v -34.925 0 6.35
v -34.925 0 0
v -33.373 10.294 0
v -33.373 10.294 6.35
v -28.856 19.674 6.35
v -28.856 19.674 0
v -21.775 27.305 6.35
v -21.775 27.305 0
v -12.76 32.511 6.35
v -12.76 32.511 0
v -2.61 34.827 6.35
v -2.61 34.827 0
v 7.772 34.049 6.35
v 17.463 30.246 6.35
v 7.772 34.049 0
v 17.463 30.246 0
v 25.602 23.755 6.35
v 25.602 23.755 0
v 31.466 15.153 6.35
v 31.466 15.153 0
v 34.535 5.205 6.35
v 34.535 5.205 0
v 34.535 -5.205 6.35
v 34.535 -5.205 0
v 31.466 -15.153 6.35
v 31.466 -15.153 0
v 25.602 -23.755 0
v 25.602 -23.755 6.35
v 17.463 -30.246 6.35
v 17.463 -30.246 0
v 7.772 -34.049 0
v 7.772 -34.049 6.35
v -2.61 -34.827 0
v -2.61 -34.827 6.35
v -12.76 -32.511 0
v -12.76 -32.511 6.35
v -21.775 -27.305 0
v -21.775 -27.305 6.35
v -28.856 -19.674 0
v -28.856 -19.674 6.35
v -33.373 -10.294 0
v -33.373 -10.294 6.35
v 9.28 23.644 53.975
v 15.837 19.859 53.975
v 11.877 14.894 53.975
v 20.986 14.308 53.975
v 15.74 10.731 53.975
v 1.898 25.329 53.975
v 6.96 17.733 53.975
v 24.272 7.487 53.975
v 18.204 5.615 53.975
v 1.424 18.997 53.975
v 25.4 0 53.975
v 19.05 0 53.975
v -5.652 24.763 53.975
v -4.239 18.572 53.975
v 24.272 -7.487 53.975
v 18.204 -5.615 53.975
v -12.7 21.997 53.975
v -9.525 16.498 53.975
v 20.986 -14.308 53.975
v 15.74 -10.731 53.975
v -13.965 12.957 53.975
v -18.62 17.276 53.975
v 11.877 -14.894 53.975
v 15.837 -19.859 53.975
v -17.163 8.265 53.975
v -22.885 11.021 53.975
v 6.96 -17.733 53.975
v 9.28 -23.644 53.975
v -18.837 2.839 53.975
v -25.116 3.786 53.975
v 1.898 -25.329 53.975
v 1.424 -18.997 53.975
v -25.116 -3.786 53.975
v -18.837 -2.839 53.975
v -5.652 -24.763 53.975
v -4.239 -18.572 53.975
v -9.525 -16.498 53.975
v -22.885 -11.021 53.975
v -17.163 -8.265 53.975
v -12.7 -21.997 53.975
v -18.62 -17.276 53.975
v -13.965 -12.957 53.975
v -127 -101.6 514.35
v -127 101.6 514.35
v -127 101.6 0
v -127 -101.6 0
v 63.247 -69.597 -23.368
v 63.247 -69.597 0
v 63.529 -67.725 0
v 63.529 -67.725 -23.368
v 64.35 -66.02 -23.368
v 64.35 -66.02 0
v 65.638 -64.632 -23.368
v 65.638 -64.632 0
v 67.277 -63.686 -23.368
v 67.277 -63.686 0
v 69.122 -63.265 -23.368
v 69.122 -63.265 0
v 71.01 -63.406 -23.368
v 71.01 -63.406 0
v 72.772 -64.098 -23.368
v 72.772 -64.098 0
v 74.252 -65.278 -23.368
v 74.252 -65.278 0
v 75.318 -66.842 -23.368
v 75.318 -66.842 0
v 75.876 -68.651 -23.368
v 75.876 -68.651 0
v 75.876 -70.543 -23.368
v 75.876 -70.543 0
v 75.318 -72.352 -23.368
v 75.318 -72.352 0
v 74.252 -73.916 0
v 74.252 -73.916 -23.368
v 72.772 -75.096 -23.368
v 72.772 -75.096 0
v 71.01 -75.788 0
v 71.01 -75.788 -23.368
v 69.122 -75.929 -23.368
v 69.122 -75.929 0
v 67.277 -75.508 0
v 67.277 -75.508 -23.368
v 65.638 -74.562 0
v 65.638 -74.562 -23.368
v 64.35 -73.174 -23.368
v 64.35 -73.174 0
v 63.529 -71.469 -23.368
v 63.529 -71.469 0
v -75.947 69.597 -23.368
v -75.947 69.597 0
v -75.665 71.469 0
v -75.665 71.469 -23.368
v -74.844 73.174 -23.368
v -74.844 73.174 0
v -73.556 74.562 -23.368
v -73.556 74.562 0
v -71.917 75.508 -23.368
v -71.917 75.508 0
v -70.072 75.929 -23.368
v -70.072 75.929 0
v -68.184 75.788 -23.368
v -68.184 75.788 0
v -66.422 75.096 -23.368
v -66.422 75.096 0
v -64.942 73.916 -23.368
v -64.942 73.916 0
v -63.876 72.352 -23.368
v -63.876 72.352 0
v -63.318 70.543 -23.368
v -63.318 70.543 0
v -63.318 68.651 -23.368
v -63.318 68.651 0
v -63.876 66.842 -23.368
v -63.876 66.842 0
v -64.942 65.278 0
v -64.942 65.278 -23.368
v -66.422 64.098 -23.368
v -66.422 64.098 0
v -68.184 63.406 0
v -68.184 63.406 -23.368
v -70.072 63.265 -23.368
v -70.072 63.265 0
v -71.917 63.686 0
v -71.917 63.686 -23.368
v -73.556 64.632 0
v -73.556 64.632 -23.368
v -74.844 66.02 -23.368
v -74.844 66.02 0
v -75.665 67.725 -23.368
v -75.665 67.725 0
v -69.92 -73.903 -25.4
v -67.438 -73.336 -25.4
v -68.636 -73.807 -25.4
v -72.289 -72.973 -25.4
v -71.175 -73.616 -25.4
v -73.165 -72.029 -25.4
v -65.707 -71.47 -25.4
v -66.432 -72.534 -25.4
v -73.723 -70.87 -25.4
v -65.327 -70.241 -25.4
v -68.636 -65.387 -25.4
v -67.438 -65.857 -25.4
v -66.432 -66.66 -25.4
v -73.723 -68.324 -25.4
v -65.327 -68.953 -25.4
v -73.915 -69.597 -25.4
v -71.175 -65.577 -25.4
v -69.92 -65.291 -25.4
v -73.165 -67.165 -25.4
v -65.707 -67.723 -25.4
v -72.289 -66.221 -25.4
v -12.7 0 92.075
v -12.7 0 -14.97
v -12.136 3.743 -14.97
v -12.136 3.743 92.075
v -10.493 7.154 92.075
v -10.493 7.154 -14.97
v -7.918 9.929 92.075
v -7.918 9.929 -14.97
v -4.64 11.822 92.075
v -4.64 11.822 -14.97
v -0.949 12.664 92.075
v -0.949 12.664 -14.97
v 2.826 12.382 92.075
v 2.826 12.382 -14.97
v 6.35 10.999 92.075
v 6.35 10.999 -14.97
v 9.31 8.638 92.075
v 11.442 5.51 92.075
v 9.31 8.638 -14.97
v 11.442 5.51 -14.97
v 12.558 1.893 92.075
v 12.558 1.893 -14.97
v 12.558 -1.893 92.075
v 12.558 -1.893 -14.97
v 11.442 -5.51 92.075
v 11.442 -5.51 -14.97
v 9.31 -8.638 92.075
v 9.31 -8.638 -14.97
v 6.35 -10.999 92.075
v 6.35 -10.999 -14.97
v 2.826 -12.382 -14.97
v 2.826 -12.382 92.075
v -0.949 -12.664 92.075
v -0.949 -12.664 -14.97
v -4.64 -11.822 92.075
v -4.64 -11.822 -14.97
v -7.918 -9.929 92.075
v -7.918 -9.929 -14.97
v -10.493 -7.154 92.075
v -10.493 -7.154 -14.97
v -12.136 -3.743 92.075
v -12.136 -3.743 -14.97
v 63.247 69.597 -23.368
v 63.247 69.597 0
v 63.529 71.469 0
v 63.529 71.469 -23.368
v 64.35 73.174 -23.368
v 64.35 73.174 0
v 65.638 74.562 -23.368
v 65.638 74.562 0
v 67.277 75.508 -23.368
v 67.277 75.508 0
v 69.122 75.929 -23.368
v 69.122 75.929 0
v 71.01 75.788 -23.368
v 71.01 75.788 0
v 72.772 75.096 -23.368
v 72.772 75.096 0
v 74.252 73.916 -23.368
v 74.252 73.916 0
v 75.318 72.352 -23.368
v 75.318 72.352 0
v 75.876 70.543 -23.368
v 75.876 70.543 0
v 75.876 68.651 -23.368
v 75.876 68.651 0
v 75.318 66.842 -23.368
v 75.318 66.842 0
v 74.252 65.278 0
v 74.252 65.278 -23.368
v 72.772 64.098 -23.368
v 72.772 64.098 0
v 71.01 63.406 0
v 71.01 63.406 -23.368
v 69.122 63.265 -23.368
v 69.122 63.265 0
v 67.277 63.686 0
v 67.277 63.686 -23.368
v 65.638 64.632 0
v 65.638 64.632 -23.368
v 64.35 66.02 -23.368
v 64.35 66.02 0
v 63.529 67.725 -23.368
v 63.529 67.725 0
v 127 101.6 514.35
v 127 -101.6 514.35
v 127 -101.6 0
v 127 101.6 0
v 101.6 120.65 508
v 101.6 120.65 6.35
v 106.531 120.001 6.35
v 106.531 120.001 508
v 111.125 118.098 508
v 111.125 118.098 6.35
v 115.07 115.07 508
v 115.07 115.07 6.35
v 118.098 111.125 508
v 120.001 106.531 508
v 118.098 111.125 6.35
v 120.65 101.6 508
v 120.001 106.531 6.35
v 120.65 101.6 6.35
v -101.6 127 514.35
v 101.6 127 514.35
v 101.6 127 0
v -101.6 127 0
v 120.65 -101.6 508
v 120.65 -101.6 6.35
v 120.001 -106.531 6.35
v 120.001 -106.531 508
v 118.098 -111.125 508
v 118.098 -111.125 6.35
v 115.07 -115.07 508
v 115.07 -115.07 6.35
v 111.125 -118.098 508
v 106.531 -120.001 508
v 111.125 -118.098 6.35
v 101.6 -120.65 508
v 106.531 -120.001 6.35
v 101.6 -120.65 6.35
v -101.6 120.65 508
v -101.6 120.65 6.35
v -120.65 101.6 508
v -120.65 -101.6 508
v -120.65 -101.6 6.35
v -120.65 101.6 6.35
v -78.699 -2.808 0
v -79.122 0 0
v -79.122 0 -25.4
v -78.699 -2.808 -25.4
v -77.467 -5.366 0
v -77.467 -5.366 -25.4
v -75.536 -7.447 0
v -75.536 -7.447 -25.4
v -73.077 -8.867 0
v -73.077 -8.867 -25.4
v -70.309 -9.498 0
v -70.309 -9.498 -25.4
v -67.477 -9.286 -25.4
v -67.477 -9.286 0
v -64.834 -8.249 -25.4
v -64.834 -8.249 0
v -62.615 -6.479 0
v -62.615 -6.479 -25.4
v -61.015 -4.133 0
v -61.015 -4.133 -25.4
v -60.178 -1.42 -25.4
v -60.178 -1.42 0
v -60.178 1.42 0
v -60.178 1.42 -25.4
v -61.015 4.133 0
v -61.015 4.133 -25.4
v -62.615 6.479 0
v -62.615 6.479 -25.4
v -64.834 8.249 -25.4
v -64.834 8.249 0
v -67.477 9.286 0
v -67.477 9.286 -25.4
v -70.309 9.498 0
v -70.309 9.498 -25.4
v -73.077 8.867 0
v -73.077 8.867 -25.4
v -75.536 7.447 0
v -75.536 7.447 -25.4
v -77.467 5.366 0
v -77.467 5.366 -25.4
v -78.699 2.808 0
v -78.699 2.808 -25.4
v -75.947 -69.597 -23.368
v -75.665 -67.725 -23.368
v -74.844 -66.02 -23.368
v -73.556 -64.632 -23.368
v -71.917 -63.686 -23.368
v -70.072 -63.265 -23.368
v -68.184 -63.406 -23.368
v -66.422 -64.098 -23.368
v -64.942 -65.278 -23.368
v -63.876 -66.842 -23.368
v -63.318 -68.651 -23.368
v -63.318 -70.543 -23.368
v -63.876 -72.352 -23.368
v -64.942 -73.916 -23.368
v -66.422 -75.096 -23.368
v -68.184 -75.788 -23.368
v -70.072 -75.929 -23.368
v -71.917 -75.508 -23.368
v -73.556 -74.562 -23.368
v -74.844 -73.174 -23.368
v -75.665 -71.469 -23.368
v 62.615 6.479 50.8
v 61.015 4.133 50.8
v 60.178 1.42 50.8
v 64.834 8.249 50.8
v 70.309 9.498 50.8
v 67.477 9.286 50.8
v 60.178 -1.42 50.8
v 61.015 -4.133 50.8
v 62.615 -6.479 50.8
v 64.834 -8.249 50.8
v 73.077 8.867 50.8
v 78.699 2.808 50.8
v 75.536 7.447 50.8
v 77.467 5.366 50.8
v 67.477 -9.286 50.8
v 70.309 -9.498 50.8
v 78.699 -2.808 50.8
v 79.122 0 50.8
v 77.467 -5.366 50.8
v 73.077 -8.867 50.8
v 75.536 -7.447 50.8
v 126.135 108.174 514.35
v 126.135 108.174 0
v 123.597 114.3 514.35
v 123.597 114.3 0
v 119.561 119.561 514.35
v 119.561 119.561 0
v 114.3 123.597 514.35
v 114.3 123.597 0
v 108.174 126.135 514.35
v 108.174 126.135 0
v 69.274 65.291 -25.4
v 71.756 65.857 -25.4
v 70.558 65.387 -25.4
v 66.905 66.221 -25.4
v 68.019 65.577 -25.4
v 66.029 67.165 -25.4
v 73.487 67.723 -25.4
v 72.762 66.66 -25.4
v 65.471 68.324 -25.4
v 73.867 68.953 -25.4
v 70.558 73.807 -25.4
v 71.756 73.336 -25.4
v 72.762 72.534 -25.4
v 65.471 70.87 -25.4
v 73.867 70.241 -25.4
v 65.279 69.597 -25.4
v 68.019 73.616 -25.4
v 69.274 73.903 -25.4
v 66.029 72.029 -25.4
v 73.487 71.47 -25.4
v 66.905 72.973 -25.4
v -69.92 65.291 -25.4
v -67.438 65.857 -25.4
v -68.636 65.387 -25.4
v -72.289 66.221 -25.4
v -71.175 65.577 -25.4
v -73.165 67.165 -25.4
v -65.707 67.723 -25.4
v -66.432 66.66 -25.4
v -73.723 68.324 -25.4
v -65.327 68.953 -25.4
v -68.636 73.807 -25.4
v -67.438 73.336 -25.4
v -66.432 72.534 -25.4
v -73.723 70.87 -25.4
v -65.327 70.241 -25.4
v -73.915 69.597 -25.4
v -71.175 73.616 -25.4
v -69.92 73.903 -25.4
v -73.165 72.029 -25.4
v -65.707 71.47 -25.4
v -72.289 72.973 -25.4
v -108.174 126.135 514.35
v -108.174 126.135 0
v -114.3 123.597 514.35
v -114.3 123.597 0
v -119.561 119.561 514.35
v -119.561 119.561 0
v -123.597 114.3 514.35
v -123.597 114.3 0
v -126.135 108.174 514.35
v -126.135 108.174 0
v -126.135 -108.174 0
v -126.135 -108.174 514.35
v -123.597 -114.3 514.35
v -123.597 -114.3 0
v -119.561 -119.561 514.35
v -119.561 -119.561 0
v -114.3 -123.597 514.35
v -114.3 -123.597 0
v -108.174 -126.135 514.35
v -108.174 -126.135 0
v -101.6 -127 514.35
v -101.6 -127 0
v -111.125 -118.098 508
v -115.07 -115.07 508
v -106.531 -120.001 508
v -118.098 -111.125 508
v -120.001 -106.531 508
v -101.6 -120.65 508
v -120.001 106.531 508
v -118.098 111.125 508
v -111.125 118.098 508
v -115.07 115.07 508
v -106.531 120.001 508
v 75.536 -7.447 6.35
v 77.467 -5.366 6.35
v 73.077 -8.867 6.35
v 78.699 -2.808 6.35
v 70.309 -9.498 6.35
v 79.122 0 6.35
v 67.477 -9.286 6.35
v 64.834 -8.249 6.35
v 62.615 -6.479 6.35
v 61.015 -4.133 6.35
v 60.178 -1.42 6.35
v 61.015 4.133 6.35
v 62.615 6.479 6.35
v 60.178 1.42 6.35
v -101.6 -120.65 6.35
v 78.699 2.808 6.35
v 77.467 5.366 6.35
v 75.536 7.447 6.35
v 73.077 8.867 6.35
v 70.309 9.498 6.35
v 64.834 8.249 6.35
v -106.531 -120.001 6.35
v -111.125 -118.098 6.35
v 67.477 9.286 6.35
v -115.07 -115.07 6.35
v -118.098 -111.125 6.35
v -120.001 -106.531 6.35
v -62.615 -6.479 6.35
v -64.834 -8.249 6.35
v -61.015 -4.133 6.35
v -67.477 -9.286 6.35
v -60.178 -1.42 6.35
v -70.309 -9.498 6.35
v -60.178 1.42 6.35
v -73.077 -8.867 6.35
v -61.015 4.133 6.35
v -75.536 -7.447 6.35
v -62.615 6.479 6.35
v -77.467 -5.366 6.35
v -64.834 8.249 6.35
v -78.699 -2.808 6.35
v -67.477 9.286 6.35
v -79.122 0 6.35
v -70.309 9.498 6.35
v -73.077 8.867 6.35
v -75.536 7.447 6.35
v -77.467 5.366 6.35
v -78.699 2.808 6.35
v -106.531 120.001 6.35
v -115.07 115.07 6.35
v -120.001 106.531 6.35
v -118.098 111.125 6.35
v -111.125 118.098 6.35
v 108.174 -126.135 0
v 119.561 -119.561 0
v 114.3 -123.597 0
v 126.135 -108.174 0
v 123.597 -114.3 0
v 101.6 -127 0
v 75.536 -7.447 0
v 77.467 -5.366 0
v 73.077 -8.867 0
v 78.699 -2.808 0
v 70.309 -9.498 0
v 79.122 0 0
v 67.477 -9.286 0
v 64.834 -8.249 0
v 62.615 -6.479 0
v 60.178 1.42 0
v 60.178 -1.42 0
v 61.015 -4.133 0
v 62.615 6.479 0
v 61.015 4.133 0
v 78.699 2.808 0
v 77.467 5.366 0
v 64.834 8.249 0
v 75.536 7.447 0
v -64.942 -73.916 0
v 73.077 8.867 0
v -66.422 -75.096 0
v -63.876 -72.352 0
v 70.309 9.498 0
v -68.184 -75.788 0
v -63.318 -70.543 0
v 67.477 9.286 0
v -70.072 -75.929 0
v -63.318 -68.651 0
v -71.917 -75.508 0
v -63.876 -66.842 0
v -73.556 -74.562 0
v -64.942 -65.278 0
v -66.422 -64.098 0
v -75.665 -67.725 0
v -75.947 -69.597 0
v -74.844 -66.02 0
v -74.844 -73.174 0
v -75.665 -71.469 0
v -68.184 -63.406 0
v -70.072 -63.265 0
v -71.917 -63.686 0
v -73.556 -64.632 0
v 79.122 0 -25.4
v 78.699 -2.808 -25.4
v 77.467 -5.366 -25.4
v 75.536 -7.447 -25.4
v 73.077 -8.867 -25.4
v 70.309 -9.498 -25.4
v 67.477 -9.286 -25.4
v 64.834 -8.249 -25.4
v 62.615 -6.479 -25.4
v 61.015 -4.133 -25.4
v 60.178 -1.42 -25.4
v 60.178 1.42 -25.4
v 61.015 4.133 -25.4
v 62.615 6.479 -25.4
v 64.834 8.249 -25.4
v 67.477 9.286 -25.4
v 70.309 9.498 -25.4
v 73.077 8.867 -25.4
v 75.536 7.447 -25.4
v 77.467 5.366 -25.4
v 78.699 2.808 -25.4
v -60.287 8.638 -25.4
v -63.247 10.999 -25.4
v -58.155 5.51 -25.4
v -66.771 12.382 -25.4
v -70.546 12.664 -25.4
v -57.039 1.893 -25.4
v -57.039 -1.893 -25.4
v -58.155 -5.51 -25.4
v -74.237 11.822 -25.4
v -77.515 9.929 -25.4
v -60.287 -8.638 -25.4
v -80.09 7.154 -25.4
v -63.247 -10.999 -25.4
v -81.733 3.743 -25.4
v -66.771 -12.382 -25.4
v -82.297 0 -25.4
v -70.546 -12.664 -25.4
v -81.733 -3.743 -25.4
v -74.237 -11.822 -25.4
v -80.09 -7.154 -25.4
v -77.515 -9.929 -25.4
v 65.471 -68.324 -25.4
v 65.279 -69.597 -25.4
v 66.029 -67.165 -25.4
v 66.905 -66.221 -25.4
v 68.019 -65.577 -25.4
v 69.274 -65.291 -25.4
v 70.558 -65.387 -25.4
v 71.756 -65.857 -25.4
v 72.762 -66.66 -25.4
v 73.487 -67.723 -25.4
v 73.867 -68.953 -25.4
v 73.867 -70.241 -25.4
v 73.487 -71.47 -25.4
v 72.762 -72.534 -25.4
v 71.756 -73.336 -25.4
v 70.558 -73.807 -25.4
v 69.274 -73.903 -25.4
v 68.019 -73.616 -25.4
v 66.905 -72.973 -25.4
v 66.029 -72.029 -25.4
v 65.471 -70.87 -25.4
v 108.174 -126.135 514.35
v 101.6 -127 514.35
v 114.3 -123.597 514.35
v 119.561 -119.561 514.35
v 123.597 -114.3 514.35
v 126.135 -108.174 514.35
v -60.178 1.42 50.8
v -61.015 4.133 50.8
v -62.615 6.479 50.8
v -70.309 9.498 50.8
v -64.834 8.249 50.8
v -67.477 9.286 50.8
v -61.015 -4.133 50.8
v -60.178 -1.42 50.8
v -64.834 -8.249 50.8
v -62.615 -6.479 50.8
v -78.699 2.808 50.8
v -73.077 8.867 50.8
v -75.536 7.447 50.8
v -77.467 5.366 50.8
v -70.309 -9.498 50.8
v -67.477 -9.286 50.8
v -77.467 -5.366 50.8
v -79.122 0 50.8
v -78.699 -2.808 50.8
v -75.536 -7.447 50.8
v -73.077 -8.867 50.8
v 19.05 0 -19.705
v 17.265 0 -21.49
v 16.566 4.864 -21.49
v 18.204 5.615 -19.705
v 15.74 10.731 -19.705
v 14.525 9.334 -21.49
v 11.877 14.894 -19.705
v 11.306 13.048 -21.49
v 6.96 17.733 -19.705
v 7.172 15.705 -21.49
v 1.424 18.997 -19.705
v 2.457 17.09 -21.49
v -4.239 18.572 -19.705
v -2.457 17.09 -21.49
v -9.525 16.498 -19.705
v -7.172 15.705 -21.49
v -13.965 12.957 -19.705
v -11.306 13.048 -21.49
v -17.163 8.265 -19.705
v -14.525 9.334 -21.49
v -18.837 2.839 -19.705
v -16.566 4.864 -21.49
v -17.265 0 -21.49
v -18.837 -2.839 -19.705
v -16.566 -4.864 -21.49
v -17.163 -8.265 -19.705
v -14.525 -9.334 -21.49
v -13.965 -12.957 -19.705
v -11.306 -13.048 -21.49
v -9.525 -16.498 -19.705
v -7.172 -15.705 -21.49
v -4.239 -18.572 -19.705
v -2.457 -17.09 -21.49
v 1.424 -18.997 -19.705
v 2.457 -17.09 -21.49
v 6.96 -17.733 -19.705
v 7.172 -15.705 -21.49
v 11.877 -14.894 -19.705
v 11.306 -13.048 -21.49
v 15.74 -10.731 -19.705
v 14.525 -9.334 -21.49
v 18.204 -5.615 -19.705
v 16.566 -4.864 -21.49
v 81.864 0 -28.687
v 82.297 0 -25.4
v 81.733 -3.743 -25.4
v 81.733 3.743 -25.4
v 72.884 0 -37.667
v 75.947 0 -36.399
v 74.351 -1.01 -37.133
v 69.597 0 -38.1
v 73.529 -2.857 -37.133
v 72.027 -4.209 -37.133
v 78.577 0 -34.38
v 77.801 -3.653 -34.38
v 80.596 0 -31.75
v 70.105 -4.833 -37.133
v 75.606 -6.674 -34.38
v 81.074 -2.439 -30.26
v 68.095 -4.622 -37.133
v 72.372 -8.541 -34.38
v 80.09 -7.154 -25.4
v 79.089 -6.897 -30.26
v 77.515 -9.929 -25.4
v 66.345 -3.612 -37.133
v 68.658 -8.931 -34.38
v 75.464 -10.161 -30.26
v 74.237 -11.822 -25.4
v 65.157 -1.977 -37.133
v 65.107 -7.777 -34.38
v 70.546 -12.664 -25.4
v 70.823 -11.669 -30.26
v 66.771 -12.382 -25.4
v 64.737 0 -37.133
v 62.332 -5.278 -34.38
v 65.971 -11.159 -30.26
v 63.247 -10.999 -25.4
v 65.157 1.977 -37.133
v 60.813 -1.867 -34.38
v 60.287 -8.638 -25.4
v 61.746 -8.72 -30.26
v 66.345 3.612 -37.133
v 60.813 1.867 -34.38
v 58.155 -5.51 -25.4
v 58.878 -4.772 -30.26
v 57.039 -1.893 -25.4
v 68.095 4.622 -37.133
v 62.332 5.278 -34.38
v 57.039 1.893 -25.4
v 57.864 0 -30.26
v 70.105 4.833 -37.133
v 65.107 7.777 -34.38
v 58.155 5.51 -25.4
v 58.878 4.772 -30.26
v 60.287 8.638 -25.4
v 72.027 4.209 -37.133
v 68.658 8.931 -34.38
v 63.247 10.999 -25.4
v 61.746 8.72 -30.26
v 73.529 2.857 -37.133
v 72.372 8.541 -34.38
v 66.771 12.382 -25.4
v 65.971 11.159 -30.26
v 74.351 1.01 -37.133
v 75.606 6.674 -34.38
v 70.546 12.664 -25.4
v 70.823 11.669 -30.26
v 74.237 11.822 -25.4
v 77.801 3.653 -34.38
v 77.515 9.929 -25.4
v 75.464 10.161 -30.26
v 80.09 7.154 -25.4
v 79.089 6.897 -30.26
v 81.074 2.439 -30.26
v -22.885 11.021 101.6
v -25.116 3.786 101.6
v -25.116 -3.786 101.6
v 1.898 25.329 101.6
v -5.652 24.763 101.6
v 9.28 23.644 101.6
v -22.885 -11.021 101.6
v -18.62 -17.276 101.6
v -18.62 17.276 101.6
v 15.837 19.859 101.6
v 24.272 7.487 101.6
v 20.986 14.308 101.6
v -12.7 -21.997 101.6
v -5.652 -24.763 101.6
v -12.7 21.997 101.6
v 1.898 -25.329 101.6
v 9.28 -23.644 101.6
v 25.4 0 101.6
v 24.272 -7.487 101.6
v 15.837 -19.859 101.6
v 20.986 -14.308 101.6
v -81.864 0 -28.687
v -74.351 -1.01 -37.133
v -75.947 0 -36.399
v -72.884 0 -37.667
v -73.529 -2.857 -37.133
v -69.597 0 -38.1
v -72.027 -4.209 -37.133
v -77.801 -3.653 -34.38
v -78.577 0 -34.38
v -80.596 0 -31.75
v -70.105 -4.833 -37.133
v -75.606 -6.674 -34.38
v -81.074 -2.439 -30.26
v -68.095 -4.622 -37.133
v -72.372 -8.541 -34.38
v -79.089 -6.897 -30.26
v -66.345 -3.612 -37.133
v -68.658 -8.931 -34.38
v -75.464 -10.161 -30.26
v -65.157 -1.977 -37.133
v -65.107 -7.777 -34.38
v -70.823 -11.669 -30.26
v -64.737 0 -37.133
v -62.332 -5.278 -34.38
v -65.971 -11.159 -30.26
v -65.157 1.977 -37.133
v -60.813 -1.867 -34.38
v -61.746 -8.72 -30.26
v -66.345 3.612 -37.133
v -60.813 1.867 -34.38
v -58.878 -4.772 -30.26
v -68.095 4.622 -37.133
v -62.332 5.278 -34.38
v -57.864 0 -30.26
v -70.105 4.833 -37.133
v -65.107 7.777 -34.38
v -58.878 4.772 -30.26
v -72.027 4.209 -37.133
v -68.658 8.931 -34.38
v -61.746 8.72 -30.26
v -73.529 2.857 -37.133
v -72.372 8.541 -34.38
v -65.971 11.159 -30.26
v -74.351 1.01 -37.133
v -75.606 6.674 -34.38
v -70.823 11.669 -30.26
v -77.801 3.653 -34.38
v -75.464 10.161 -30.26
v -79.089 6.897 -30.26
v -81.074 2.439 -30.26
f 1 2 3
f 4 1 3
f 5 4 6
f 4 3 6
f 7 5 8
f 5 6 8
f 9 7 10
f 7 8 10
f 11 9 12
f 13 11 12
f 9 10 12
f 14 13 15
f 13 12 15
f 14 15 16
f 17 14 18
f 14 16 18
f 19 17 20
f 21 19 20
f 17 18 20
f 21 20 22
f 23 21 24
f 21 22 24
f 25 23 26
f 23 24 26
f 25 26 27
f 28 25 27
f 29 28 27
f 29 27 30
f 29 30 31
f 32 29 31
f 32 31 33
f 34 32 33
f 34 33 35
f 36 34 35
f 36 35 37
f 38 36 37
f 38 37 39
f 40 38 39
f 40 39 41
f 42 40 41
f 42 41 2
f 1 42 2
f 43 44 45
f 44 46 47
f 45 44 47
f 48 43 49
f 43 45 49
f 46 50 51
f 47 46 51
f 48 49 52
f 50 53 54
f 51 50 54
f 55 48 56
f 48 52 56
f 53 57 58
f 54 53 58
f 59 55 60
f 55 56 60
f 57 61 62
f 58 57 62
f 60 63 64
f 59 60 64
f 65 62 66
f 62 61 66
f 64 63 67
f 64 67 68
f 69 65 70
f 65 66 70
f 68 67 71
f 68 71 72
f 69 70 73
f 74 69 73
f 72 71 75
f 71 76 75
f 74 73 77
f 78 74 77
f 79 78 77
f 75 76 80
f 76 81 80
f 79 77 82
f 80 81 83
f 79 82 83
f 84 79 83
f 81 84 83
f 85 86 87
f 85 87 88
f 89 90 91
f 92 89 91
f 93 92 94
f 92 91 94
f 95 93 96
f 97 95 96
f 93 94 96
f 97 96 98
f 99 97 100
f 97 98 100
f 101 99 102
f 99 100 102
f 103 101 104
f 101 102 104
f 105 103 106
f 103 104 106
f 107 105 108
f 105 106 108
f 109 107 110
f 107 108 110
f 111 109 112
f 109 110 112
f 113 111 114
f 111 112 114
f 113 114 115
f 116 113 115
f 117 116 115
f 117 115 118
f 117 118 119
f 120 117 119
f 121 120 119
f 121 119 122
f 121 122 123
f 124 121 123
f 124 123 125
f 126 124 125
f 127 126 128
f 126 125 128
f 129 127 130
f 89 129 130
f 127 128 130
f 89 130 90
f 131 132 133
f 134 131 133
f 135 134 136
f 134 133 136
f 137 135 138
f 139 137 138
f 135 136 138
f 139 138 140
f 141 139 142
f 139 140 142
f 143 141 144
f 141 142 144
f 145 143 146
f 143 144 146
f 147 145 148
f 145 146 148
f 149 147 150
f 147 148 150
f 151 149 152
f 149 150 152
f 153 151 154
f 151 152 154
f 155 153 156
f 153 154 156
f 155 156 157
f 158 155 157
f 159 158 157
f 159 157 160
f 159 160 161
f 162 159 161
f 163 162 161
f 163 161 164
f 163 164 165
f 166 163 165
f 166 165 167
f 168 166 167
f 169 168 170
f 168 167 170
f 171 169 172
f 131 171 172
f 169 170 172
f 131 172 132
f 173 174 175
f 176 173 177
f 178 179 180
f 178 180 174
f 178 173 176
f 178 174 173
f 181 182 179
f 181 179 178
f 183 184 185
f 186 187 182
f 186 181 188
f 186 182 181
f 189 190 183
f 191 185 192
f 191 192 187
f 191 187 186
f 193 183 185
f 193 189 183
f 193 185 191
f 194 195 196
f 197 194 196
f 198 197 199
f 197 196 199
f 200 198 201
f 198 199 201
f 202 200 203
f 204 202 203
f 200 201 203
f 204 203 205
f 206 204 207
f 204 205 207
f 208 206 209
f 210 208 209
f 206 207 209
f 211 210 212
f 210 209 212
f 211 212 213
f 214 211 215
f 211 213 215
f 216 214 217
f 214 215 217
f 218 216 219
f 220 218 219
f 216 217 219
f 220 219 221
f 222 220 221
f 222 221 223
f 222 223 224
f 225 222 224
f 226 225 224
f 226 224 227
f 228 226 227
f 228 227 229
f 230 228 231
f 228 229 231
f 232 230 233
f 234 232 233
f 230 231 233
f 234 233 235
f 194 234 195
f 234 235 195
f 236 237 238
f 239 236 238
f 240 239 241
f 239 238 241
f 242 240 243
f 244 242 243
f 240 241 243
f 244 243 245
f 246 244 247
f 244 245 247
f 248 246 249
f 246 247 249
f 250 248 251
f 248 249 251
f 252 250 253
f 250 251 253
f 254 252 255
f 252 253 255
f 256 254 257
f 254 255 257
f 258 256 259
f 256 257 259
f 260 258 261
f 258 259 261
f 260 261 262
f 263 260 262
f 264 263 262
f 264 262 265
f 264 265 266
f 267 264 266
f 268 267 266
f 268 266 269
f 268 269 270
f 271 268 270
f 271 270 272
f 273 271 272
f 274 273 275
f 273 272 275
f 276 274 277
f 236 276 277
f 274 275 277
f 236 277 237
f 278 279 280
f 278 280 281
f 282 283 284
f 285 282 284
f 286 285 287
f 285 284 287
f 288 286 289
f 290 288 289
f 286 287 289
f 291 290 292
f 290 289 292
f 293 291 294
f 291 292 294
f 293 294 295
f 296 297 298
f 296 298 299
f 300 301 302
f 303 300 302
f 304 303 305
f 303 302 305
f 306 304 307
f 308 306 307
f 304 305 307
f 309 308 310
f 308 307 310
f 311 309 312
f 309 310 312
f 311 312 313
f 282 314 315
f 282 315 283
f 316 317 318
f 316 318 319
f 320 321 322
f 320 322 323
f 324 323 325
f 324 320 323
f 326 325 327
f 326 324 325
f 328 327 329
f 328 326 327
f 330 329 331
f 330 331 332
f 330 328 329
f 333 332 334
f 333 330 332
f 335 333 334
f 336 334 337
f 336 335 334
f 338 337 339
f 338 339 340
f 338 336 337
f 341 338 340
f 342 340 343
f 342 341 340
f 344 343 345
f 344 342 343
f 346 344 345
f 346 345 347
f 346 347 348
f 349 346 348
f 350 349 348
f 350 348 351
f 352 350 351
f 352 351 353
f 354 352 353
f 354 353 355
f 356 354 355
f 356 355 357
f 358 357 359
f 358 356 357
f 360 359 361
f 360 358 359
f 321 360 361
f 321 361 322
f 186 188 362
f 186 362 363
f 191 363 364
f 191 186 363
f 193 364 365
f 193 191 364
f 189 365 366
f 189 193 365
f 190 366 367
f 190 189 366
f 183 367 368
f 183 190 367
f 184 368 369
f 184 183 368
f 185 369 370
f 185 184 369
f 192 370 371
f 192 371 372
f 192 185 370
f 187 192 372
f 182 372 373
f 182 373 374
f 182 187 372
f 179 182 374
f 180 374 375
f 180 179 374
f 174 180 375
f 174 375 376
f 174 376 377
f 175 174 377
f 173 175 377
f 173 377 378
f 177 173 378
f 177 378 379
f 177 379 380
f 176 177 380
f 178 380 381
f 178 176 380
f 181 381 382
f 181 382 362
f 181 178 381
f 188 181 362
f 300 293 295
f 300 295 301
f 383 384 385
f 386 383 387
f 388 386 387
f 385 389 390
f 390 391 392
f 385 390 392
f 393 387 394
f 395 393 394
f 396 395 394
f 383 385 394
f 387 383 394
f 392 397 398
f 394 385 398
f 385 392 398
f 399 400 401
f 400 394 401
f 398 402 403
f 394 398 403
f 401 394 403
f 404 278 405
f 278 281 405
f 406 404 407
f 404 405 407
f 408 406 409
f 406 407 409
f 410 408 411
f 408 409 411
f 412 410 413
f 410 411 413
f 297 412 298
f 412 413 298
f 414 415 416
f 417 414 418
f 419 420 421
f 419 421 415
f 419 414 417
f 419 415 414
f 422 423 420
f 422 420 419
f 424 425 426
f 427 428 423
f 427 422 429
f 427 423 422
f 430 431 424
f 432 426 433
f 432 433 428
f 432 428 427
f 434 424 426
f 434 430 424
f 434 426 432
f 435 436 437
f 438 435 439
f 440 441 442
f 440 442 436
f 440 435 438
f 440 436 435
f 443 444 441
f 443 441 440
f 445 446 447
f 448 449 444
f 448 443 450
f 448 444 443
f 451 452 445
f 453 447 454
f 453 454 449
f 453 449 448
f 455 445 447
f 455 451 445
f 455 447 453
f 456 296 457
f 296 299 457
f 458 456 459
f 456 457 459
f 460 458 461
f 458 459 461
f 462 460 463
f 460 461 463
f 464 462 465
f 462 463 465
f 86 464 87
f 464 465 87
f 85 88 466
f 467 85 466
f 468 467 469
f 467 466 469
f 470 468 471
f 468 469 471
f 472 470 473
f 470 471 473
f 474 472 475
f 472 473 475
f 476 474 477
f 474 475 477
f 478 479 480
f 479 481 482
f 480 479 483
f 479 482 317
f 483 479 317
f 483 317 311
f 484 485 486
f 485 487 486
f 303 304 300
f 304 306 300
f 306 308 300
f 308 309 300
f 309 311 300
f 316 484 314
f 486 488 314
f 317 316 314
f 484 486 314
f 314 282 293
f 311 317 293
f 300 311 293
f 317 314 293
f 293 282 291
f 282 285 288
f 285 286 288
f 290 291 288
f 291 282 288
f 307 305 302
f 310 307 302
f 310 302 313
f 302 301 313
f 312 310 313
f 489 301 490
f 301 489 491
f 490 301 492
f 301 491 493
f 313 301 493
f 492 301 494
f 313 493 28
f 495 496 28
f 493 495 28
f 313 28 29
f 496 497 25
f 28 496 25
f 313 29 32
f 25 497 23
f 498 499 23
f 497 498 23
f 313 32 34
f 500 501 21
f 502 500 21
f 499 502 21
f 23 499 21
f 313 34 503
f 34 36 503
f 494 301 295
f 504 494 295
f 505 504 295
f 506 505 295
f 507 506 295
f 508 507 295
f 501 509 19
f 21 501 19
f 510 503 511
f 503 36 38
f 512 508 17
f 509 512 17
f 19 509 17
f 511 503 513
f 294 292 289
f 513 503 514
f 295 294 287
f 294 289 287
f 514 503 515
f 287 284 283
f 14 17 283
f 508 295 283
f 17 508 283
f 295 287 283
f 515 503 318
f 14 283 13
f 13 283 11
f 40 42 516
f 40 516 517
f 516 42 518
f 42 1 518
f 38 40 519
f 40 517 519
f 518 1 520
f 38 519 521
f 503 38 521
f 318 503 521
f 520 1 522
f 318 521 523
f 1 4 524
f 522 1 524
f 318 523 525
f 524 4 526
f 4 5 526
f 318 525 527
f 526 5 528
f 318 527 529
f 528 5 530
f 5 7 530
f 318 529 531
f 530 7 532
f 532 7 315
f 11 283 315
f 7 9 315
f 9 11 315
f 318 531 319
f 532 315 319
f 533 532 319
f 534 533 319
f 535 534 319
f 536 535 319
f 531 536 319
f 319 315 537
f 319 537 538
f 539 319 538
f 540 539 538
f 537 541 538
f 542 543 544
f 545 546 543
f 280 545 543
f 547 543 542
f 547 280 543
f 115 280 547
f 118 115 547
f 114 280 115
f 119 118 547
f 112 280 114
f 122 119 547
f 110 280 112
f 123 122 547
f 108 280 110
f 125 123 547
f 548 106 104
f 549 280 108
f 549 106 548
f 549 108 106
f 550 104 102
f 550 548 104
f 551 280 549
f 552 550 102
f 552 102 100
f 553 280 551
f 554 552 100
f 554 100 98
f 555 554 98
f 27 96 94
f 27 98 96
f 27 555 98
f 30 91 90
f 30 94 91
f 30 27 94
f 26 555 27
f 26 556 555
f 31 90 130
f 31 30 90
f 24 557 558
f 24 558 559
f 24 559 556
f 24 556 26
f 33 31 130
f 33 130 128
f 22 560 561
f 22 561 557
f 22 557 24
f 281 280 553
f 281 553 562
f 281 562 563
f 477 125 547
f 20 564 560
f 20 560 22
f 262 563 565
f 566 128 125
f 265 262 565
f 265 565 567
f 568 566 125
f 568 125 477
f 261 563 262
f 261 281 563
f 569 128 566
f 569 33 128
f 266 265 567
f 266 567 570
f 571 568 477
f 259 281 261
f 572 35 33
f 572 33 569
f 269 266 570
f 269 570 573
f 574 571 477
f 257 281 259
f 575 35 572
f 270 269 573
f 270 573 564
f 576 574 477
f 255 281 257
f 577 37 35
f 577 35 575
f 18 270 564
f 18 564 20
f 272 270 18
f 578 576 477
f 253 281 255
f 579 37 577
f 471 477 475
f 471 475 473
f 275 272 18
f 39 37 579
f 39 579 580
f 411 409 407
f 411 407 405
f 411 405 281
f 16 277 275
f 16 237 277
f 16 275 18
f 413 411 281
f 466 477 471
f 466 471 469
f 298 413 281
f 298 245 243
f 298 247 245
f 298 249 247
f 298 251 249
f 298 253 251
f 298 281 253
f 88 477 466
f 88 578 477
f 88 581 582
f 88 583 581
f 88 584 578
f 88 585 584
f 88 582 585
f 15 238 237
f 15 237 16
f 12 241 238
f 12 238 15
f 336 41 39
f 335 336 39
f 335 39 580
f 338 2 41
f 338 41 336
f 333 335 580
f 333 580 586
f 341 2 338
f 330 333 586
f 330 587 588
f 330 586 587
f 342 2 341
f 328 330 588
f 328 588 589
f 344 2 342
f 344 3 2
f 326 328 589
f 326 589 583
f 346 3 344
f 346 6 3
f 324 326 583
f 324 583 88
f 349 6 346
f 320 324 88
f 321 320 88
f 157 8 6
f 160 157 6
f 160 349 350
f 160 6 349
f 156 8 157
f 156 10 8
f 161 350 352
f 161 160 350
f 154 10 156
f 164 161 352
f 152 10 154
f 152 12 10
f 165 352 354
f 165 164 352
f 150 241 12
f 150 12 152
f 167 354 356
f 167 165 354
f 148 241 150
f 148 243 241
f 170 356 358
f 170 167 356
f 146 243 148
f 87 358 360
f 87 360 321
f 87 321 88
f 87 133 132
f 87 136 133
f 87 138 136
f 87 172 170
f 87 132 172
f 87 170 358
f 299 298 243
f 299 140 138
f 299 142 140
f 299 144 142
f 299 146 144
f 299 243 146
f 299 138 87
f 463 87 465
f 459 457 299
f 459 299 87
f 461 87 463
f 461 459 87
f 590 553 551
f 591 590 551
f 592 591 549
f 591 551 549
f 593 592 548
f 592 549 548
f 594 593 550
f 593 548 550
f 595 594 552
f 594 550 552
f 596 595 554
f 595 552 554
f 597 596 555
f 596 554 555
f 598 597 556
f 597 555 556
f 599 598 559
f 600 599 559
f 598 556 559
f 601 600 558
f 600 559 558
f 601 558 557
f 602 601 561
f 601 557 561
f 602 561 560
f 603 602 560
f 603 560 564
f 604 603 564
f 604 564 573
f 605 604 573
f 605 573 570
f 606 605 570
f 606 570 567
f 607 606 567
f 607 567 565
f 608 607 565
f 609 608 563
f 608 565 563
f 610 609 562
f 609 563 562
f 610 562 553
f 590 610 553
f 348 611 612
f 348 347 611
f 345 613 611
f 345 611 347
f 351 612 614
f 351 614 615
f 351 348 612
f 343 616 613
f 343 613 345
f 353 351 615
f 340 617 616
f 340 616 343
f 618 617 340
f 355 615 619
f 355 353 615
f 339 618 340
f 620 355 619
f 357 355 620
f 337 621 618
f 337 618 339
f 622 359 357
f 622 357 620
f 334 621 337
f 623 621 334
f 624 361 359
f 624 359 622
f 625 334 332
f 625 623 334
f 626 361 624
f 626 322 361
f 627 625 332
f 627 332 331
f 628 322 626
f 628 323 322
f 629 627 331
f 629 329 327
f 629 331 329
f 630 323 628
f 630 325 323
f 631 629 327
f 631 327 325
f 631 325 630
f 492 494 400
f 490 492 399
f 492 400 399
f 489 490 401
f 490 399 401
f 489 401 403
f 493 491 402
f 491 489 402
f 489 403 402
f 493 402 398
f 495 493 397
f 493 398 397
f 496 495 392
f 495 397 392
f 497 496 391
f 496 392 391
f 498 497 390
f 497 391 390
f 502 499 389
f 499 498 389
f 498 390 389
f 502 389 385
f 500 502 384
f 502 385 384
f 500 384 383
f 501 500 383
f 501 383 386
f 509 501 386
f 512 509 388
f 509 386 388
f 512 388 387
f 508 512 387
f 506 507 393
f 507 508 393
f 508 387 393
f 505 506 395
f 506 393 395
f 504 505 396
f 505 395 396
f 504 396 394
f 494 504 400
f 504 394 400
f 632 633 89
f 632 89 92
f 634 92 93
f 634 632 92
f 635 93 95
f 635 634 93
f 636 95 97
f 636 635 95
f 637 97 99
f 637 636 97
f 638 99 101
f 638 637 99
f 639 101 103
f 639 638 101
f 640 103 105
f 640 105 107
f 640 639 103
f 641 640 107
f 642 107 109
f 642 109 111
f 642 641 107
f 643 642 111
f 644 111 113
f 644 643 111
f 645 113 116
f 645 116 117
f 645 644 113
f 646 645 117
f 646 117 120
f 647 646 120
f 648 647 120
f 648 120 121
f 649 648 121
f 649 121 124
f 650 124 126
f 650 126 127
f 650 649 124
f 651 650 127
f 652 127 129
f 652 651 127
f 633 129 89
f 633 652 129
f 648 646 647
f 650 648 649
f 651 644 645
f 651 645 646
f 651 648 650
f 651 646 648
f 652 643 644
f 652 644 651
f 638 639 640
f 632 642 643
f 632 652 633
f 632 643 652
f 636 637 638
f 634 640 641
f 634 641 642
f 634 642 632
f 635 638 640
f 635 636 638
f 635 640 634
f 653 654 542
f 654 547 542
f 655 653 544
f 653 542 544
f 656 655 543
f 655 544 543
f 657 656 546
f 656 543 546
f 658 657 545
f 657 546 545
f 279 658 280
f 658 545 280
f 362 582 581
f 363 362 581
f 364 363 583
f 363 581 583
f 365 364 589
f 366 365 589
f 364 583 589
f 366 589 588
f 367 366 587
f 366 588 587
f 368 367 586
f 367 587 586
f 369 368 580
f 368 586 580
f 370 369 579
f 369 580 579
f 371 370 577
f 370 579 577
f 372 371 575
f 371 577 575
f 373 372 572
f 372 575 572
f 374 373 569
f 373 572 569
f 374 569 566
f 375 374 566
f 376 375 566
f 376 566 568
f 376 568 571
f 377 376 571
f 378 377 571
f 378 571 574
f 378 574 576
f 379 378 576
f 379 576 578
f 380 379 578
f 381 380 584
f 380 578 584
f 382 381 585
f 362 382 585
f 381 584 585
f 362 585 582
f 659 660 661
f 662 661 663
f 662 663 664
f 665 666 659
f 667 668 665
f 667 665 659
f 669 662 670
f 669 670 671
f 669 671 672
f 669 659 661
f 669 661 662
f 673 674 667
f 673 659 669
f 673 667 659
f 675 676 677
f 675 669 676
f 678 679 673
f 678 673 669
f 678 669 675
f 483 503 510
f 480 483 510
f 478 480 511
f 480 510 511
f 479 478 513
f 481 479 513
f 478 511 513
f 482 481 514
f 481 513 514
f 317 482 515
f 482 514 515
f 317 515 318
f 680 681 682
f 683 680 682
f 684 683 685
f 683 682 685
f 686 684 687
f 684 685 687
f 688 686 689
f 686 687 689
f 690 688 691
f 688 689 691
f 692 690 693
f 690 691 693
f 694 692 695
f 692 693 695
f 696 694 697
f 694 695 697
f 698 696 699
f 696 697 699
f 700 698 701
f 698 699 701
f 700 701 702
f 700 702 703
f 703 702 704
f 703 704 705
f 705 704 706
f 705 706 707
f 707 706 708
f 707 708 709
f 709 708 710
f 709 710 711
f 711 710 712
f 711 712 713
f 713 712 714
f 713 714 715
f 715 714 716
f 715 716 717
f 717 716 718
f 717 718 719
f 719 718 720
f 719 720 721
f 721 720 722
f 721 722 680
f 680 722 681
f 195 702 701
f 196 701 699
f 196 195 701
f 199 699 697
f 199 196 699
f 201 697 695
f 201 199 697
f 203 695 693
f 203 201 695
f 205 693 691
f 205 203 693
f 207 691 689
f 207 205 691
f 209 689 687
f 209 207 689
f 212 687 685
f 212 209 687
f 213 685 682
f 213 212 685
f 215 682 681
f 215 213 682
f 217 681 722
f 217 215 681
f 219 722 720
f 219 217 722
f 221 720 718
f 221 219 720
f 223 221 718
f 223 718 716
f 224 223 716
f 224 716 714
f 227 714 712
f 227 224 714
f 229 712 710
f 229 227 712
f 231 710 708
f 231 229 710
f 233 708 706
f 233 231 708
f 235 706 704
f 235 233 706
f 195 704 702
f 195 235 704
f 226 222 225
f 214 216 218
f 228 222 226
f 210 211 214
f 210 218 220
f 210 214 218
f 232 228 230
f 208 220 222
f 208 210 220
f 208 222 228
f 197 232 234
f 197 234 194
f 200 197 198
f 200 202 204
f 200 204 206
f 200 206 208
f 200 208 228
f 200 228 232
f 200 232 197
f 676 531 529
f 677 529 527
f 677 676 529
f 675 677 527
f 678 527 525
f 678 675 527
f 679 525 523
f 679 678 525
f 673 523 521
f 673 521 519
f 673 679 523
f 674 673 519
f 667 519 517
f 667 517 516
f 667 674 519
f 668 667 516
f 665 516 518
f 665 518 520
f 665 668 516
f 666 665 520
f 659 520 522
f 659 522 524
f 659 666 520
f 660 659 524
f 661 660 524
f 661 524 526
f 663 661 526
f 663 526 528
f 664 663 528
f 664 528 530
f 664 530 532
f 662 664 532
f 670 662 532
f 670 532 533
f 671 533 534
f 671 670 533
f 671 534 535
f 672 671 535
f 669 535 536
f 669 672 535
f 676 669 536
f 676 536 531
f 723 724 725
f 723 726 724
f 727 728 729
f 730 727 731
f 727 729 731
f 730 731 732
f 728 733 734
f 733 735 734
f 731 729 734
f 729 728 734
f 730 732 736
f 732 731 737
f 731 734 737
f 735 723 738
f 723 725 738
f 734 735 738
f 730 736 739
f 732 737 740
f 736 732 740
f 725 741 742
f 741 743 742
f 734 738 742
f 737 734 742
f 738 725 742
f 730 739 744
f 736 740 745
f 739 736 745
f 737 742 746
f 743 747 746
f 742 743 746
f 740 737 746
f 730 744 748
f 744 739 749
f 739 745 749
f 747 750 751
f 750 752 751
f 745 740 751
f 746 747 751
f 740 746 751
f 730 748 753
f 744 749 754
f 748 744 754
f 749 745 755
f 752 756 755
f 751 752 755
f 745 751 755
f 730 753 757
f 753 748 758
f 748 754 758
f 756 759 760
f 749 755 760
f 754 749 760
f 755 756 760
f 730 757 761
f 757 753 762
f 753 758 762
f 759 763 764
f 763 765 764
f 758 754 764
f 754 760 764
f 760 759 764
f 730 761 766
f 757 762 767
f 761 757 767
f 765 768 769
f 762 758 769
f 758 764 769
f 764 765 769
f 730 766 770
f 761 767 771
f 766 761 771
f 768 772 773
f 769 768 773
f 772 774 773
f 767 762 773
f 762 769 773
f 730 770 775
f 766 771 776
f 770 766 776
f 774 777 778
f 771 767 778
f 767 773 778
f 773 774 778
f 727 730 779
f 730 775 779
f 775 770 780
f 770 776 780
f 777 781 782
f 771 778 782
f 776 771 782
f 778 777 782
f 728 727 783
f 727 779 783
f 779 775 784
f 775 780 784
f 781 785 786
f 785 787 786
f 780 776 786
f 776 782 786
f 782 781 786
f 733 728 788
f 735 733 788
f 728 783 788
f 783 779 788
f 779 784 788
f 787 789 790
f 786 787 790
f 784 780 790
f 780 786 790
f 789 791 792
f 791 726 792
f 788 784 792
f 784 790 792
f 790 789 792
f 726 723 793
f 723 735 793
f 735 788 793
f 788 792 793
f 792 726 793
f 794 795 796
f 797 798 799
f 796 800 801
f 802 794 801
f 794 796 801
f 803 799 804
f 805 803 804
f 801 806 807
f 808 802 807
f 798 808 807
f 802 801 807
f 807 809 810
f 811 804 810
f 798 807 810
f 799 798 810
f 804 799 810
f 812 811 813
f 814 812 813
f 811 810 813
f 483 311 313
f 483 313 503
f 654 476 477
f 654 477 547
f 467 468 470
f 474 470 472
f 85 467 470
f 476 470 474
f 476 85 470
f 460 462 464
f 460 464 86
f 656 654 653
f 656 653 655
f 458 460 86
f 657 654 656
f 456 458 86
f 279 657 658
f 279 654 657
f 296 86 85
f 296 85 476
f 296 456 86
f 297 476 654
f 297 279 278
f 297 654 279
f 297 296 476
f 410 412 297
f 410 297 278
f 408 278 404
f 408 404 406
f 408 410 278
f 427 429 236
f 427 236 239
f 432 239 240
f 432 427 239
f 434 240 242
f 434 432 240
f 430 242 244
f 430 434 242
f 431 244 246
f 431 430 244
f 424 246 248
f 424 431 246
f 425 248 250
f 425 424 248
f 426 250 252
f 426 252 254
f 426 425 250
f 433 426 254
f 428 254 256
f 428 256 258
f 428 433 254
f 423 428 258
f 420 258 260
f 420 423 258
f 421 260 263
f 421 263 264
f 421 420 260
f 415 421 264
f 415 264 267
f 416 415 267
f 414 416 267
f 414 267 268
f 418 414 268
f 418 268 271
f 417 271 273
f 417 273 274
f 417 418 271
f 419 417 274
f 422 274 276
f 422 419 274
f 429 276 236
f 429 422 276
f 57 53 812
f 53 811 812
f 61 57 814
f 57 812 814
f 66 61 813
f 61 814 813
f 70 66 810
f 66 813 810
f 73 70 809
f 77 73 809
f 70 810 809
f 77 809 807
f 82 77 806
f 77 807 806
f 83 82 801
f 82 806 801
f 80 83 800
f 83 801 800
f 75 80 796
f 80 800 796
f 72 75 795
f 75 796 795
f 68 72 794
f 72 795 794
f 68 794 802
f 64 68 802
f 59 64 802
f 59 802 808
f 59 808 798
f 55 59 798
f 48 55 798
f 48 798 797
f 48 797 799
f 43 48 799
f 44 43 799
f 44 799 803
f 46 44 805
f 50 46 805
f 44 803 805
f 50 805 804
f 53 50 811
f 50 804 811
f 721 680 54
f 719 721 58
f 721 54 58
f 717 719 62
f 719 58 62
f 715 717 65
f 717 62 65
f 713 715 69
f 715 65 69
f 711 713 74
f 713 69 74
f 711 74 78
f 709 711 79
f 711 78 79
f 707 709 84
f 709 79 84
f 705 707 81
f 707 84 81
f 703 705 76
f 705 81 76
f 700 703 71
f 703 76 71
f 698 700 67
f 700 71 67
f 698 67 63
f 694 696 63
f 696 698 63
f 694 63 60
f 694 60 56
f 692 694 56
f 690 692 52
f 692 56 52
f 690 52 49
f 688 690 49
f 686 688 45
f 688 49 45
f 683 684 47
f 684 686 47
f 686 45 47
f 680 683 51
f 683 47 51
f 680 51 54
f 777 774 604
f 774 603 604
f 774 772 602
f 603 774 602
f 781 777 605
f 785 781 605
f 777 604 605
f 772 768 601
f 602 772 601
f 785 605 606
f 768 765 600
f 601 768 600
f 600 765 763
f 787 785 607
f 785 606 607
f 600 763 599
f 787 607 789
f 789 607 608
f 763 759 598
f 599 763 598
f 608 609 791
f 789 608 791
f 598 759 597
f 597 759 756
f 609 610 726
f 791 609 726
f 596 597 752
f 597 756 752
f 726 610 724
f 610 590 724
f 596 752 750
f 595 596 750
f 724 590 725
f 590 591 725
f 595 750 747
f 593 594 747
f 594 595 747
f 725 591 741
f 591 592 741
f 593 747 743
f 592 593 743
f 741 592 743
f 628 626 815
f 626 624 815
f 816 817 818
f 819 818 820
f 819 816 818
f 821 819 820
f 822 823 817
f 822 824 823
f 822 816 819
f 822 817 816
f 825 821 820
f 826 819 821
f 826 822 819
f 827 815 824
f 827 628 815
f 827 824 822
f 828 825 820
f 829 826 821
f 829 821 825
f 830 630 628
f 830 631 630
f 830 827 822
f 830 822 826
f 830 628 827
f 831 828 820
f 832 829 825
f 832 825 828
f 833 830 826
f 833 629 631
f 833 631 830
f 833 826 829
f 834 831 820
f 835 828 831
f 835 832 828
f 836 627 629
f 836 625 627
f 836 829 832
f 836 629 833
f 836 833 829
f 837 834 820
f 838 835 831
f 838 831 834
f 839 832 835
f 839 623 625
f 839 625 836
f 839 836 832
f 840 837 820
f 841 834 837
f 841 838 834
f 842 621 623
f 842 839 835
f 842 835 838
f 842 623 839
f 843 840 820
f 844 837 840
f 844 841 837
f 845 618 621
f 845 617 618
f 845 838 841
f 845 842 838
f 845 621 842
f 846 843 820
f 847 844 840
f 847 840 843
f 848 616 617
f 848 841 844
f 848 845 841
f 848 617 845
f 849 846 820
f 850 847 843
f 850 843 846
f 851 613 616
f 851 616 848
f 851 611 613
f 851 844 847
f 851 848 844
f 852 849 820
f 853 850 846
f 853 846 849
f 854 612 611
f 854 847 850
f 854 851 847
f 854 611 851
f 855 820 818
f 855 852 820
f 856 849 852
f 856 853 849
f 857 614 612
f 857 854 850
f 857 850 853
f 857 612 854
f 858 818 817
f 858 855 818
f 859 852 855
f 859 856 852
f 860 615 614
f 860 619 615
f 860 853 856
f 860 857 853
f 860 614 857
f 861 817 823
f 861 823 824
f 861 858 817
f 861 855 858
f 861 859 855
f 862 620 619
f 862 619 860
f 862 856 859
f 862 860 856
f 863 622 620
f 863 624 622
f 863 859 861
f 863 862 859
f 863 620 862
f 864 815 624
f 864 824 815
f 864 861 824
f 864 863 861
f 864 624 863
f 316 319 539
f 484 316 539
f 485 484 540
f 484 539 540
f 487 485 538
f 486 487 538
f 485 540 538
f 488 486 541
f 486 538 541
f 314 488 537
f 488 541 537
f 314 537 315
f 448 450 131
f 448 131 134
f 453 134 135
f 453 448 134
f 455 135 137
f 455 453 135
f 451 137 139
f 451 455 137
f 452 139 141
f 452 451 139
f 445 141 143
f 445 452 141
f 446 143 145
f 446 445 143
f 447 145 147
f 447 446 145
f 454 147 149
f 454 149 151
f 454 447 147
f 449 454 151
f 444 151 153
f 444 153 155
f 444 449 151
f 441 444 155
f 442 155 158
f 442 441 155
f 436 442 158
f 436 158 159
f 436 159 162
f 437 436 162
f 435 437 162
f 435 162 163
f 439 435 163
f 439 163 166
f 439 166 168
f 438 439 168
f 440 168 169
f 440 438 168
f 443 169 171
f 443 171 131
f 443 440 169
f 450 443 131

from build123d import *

# Parameters (mm, degrees)
BOSS_EXTRUDE1_DEPTH = 508
SHELL1_T            = -6.35
CUT_EXTRUDE1_REACH  = 540.815
SKETCH3_R           = 34.925
SKETCH5_R           = 6.35
BOSS_EXTRUDE2_DEPTH = 25.4
CHAMFER1_SIZE       = 2.032
SKETCH10_R          = 12.7
CUT_EXTRUDE2_DEPTH  = 114.3
CHAMFER2_SIZE       = 5.08
CHAMFER2_SIZE2      = 7.254991874
BOSS_EXTRUDE3_DEPTH = 6.35


# Read off the part's stored shape, not the designer's step: 1-1/2-6 Machine Threads Stud1
with BuildPart() as part:
    # Sketch2 → Boss-Extrude1 (new body)
    with BuildSketch(Plane.XY):
        with BuildLine():
            Line((-101.6, 127), (101.6, 127))
            ThreePointArc((101.6, 127), (119.560512242, 119.560512242), (127, 101.6))
            Line((127, 101.6), (127, -101.6))
            ThreePointArc((127, -101.6), (119.560512242, -119.560512242), (101.6, -127))
            Line((101.6, -127), (-101.6, -127))
            ThreePointArc((-101.6, -127), (-119.560512242, -119.560512242), (-127, -101.6))
            Line((-127, -101.6), (-127, 101.6))
            ThreePointArc((-127, 101.6), (-119.560512242, 119.560512242), (-101.6, 127))
        make_face()
    extrude(amount=BOSS_EXTRUDE1_DEPTH)

    # Shell1
    shell1_openings = [part.faces().sort_by_distance(p)[0] for p in [
        (0, 0, 508),
    ]]
    offset(amount=SHELL1_T, openings=shell1_openings, kind=Kind.INTERSECTION)

    # Sketch3 → Cut-Extrude1 (cut, up to next)
    with BuildSketch(Plane(origin=(0, 0, 0), x_dir=(-1, 0, 0), z_dir=(0, 0, -1)), mode=Mode.PRIVATE) as cut_extrude1_sk1:
        Circle(SKETCH3_R)
    cut_extrude1_tool1 = extrude(cut_extrude1_sk1.sketch, amount=-CUT_EXTRUDE1_REACH, mode=Mode.PRIVATE) & part.part
    add(cut_extrude1_tool1.solids().sort_by_distance((0, 0, 0))[0], mode=Mode.SUBTRACT)

    # Sketch5 → Boss-Extrude2 (add)
    with BuildSketch(Plane(origin=(0, 0, 0), x_dir=(-1, 0, 0), z_dir=(0, 0, -1))):
        with Locations((-69.596984938, 69.596984938)):
            Circle(SKETCH5_R)
        with Locations((69.596984938, 69.596984938)):
            Circle(SKETCH5_R)
        with Locations((69.596984938, -69.596984938)):
            Circle(SKETCH5_R)
        with Locations((-69.596984938, -69.596984938)):
            Circle(SKETCH5_R)
    extrude(amount=BOSS_EXTRUDE2_DEPTH)

    # Chamfer1
    chamfer1_edges = [part.edges().sort_by_distance(p)[0] for p in [
        (75.946984938, -69.596984938, -25.4),
        (-63.246984938, -69.596984938, -25.4),
        (-63.246984938, 69.596984938, -25.4),
        (75.946984938, 69.596984938, -25.4),
    ]]
    chamfer(chamfer1_edges, length=CHAMFER1_SIZE)

    # Sketch7 → Revolve3 (revolve)
    with BuildSketch(Plane(origin=(0, 0, 0), x_dir=(1, 0, 0), z_dir=(0, 1, 0)), mode=Mode.PRIVATE) as revolve3_sk:
        with BuildLine():
            Line((-60.071984938, 25.4), (-60.071984938, -50.8))
            Line((-60.071984938, -50.8), (-69.596984938, -50.8))
            Line((-69.596984938, -50.8), (-69.596984938, 38.1))
            ThreePointArc((-69.596984938, 38.1), (-60.616728817, 34.380256121), (-56.896984938, 25.4))
            Line((-56.896984938, 25.4), (-60.071984938, 25.4))
        make_face()
    revolve3 = revolve(revolve3_sk.sketch.rotate(Axis((-69.596984938, 0, -42.573078711), (0, 0, 1)), 180), axis=Axis((-69.596984938, 0, -42.573078711), (0, 0, 1)))

    # Mirror1: Revolve3 across plane
    add(revolve3.mirror(Plane(origin=(0, 0, 0), x_dir=(0, 0, 1), z_dir=(1, 0, 0))))

    # Sketch12 → Boss-Extrude3 (add)
    with BuildSketch(Plane.XY.offset(508)):
        with BuildLine():
            Line((-101.6, -127), (101.6, -127))
            ThreePointArc((101.6, -127), (119.560512242, -119.560512242), (127, -101.6))
            Line((127, -101.6), (127, 101.6))
            ThreePointArc((127, 101.6), (119.560512242, 119.560512242), (101.6, 127))
            Line((101.6, 127), (-101.6, 127))
            ThreePointArc((-101.6, 127), (-119.560512242, 119.560512242), (-127, 101.6))
            Line((-127, 101.6), (-127, -101.6))
            ThreePointArc((-127, -101.6), (-119.560512242, -119.560512242), (-101.6, -127))
        make_face()
    extrude(amount=BOSS_EXTRUDE3_DEPTH)


with BuildPart() as body_2:
    # Sketch9 → Revolve4 (revolve)
    with BuildSketch(Plane(origin=(0, 0, 0), x_dir=(1, 0, 0), z_dir=(0, 1, 0))):
        Polygon((0, 22.225), (19.05, 22.225), (19.05, -53.975), (25.4, -53.975), (25.4, -101.6), (0, -101.6), align=None)
    revolve(axis=Axis((0, 0, 101.6), (0, 0, -1)))

    # Sketch10 → Cut-Extrude2 (cut)
    with BuildSketch(Plane(origin=(0, 0, -22.225), x_dir=(-1, 0, 0), z_dir=(0, 0, -1))):
        Circle(SKETCH10_R)
    extrude(amount=-CUT_EXTRUDE2_DEPTH, mode=Mode.SUBTRACT)

    # Chamfer2
    chamfer2_edges = [body_2.edges().sort_by_distance(p)[0] for p in [
        (12.7, 0, -22.225),
    ]]
    chamfer2_side = [body_2.faces().sort_by_distance(p)[0] for p in [
        (-18.511184633, 0, -22.225),
    ]]
    chamfer(chamfer2_edges, length=CHAMFER2_SIZE, length2=CHAMFER2_SIZE2, reference=chamfer2_side[0])

    # 1-1/2-6 Machine Threads Stud1 outline → 1-1/2-6 Machine Threads Stud1 (revolve, cut)
    with BuildSketch(Plane.XZ):
        Polygon((17.265336151, -21.489983849), (17.265336151, -22.225), (19.05, -22.225), (19.05, -19.70532), align=None)
    revolve(axis=Axis((0, 0, 0), (0, 0, 1)), mode=Mode.SUBTRACT)


solid = Compound([part.part, body_2.part])
